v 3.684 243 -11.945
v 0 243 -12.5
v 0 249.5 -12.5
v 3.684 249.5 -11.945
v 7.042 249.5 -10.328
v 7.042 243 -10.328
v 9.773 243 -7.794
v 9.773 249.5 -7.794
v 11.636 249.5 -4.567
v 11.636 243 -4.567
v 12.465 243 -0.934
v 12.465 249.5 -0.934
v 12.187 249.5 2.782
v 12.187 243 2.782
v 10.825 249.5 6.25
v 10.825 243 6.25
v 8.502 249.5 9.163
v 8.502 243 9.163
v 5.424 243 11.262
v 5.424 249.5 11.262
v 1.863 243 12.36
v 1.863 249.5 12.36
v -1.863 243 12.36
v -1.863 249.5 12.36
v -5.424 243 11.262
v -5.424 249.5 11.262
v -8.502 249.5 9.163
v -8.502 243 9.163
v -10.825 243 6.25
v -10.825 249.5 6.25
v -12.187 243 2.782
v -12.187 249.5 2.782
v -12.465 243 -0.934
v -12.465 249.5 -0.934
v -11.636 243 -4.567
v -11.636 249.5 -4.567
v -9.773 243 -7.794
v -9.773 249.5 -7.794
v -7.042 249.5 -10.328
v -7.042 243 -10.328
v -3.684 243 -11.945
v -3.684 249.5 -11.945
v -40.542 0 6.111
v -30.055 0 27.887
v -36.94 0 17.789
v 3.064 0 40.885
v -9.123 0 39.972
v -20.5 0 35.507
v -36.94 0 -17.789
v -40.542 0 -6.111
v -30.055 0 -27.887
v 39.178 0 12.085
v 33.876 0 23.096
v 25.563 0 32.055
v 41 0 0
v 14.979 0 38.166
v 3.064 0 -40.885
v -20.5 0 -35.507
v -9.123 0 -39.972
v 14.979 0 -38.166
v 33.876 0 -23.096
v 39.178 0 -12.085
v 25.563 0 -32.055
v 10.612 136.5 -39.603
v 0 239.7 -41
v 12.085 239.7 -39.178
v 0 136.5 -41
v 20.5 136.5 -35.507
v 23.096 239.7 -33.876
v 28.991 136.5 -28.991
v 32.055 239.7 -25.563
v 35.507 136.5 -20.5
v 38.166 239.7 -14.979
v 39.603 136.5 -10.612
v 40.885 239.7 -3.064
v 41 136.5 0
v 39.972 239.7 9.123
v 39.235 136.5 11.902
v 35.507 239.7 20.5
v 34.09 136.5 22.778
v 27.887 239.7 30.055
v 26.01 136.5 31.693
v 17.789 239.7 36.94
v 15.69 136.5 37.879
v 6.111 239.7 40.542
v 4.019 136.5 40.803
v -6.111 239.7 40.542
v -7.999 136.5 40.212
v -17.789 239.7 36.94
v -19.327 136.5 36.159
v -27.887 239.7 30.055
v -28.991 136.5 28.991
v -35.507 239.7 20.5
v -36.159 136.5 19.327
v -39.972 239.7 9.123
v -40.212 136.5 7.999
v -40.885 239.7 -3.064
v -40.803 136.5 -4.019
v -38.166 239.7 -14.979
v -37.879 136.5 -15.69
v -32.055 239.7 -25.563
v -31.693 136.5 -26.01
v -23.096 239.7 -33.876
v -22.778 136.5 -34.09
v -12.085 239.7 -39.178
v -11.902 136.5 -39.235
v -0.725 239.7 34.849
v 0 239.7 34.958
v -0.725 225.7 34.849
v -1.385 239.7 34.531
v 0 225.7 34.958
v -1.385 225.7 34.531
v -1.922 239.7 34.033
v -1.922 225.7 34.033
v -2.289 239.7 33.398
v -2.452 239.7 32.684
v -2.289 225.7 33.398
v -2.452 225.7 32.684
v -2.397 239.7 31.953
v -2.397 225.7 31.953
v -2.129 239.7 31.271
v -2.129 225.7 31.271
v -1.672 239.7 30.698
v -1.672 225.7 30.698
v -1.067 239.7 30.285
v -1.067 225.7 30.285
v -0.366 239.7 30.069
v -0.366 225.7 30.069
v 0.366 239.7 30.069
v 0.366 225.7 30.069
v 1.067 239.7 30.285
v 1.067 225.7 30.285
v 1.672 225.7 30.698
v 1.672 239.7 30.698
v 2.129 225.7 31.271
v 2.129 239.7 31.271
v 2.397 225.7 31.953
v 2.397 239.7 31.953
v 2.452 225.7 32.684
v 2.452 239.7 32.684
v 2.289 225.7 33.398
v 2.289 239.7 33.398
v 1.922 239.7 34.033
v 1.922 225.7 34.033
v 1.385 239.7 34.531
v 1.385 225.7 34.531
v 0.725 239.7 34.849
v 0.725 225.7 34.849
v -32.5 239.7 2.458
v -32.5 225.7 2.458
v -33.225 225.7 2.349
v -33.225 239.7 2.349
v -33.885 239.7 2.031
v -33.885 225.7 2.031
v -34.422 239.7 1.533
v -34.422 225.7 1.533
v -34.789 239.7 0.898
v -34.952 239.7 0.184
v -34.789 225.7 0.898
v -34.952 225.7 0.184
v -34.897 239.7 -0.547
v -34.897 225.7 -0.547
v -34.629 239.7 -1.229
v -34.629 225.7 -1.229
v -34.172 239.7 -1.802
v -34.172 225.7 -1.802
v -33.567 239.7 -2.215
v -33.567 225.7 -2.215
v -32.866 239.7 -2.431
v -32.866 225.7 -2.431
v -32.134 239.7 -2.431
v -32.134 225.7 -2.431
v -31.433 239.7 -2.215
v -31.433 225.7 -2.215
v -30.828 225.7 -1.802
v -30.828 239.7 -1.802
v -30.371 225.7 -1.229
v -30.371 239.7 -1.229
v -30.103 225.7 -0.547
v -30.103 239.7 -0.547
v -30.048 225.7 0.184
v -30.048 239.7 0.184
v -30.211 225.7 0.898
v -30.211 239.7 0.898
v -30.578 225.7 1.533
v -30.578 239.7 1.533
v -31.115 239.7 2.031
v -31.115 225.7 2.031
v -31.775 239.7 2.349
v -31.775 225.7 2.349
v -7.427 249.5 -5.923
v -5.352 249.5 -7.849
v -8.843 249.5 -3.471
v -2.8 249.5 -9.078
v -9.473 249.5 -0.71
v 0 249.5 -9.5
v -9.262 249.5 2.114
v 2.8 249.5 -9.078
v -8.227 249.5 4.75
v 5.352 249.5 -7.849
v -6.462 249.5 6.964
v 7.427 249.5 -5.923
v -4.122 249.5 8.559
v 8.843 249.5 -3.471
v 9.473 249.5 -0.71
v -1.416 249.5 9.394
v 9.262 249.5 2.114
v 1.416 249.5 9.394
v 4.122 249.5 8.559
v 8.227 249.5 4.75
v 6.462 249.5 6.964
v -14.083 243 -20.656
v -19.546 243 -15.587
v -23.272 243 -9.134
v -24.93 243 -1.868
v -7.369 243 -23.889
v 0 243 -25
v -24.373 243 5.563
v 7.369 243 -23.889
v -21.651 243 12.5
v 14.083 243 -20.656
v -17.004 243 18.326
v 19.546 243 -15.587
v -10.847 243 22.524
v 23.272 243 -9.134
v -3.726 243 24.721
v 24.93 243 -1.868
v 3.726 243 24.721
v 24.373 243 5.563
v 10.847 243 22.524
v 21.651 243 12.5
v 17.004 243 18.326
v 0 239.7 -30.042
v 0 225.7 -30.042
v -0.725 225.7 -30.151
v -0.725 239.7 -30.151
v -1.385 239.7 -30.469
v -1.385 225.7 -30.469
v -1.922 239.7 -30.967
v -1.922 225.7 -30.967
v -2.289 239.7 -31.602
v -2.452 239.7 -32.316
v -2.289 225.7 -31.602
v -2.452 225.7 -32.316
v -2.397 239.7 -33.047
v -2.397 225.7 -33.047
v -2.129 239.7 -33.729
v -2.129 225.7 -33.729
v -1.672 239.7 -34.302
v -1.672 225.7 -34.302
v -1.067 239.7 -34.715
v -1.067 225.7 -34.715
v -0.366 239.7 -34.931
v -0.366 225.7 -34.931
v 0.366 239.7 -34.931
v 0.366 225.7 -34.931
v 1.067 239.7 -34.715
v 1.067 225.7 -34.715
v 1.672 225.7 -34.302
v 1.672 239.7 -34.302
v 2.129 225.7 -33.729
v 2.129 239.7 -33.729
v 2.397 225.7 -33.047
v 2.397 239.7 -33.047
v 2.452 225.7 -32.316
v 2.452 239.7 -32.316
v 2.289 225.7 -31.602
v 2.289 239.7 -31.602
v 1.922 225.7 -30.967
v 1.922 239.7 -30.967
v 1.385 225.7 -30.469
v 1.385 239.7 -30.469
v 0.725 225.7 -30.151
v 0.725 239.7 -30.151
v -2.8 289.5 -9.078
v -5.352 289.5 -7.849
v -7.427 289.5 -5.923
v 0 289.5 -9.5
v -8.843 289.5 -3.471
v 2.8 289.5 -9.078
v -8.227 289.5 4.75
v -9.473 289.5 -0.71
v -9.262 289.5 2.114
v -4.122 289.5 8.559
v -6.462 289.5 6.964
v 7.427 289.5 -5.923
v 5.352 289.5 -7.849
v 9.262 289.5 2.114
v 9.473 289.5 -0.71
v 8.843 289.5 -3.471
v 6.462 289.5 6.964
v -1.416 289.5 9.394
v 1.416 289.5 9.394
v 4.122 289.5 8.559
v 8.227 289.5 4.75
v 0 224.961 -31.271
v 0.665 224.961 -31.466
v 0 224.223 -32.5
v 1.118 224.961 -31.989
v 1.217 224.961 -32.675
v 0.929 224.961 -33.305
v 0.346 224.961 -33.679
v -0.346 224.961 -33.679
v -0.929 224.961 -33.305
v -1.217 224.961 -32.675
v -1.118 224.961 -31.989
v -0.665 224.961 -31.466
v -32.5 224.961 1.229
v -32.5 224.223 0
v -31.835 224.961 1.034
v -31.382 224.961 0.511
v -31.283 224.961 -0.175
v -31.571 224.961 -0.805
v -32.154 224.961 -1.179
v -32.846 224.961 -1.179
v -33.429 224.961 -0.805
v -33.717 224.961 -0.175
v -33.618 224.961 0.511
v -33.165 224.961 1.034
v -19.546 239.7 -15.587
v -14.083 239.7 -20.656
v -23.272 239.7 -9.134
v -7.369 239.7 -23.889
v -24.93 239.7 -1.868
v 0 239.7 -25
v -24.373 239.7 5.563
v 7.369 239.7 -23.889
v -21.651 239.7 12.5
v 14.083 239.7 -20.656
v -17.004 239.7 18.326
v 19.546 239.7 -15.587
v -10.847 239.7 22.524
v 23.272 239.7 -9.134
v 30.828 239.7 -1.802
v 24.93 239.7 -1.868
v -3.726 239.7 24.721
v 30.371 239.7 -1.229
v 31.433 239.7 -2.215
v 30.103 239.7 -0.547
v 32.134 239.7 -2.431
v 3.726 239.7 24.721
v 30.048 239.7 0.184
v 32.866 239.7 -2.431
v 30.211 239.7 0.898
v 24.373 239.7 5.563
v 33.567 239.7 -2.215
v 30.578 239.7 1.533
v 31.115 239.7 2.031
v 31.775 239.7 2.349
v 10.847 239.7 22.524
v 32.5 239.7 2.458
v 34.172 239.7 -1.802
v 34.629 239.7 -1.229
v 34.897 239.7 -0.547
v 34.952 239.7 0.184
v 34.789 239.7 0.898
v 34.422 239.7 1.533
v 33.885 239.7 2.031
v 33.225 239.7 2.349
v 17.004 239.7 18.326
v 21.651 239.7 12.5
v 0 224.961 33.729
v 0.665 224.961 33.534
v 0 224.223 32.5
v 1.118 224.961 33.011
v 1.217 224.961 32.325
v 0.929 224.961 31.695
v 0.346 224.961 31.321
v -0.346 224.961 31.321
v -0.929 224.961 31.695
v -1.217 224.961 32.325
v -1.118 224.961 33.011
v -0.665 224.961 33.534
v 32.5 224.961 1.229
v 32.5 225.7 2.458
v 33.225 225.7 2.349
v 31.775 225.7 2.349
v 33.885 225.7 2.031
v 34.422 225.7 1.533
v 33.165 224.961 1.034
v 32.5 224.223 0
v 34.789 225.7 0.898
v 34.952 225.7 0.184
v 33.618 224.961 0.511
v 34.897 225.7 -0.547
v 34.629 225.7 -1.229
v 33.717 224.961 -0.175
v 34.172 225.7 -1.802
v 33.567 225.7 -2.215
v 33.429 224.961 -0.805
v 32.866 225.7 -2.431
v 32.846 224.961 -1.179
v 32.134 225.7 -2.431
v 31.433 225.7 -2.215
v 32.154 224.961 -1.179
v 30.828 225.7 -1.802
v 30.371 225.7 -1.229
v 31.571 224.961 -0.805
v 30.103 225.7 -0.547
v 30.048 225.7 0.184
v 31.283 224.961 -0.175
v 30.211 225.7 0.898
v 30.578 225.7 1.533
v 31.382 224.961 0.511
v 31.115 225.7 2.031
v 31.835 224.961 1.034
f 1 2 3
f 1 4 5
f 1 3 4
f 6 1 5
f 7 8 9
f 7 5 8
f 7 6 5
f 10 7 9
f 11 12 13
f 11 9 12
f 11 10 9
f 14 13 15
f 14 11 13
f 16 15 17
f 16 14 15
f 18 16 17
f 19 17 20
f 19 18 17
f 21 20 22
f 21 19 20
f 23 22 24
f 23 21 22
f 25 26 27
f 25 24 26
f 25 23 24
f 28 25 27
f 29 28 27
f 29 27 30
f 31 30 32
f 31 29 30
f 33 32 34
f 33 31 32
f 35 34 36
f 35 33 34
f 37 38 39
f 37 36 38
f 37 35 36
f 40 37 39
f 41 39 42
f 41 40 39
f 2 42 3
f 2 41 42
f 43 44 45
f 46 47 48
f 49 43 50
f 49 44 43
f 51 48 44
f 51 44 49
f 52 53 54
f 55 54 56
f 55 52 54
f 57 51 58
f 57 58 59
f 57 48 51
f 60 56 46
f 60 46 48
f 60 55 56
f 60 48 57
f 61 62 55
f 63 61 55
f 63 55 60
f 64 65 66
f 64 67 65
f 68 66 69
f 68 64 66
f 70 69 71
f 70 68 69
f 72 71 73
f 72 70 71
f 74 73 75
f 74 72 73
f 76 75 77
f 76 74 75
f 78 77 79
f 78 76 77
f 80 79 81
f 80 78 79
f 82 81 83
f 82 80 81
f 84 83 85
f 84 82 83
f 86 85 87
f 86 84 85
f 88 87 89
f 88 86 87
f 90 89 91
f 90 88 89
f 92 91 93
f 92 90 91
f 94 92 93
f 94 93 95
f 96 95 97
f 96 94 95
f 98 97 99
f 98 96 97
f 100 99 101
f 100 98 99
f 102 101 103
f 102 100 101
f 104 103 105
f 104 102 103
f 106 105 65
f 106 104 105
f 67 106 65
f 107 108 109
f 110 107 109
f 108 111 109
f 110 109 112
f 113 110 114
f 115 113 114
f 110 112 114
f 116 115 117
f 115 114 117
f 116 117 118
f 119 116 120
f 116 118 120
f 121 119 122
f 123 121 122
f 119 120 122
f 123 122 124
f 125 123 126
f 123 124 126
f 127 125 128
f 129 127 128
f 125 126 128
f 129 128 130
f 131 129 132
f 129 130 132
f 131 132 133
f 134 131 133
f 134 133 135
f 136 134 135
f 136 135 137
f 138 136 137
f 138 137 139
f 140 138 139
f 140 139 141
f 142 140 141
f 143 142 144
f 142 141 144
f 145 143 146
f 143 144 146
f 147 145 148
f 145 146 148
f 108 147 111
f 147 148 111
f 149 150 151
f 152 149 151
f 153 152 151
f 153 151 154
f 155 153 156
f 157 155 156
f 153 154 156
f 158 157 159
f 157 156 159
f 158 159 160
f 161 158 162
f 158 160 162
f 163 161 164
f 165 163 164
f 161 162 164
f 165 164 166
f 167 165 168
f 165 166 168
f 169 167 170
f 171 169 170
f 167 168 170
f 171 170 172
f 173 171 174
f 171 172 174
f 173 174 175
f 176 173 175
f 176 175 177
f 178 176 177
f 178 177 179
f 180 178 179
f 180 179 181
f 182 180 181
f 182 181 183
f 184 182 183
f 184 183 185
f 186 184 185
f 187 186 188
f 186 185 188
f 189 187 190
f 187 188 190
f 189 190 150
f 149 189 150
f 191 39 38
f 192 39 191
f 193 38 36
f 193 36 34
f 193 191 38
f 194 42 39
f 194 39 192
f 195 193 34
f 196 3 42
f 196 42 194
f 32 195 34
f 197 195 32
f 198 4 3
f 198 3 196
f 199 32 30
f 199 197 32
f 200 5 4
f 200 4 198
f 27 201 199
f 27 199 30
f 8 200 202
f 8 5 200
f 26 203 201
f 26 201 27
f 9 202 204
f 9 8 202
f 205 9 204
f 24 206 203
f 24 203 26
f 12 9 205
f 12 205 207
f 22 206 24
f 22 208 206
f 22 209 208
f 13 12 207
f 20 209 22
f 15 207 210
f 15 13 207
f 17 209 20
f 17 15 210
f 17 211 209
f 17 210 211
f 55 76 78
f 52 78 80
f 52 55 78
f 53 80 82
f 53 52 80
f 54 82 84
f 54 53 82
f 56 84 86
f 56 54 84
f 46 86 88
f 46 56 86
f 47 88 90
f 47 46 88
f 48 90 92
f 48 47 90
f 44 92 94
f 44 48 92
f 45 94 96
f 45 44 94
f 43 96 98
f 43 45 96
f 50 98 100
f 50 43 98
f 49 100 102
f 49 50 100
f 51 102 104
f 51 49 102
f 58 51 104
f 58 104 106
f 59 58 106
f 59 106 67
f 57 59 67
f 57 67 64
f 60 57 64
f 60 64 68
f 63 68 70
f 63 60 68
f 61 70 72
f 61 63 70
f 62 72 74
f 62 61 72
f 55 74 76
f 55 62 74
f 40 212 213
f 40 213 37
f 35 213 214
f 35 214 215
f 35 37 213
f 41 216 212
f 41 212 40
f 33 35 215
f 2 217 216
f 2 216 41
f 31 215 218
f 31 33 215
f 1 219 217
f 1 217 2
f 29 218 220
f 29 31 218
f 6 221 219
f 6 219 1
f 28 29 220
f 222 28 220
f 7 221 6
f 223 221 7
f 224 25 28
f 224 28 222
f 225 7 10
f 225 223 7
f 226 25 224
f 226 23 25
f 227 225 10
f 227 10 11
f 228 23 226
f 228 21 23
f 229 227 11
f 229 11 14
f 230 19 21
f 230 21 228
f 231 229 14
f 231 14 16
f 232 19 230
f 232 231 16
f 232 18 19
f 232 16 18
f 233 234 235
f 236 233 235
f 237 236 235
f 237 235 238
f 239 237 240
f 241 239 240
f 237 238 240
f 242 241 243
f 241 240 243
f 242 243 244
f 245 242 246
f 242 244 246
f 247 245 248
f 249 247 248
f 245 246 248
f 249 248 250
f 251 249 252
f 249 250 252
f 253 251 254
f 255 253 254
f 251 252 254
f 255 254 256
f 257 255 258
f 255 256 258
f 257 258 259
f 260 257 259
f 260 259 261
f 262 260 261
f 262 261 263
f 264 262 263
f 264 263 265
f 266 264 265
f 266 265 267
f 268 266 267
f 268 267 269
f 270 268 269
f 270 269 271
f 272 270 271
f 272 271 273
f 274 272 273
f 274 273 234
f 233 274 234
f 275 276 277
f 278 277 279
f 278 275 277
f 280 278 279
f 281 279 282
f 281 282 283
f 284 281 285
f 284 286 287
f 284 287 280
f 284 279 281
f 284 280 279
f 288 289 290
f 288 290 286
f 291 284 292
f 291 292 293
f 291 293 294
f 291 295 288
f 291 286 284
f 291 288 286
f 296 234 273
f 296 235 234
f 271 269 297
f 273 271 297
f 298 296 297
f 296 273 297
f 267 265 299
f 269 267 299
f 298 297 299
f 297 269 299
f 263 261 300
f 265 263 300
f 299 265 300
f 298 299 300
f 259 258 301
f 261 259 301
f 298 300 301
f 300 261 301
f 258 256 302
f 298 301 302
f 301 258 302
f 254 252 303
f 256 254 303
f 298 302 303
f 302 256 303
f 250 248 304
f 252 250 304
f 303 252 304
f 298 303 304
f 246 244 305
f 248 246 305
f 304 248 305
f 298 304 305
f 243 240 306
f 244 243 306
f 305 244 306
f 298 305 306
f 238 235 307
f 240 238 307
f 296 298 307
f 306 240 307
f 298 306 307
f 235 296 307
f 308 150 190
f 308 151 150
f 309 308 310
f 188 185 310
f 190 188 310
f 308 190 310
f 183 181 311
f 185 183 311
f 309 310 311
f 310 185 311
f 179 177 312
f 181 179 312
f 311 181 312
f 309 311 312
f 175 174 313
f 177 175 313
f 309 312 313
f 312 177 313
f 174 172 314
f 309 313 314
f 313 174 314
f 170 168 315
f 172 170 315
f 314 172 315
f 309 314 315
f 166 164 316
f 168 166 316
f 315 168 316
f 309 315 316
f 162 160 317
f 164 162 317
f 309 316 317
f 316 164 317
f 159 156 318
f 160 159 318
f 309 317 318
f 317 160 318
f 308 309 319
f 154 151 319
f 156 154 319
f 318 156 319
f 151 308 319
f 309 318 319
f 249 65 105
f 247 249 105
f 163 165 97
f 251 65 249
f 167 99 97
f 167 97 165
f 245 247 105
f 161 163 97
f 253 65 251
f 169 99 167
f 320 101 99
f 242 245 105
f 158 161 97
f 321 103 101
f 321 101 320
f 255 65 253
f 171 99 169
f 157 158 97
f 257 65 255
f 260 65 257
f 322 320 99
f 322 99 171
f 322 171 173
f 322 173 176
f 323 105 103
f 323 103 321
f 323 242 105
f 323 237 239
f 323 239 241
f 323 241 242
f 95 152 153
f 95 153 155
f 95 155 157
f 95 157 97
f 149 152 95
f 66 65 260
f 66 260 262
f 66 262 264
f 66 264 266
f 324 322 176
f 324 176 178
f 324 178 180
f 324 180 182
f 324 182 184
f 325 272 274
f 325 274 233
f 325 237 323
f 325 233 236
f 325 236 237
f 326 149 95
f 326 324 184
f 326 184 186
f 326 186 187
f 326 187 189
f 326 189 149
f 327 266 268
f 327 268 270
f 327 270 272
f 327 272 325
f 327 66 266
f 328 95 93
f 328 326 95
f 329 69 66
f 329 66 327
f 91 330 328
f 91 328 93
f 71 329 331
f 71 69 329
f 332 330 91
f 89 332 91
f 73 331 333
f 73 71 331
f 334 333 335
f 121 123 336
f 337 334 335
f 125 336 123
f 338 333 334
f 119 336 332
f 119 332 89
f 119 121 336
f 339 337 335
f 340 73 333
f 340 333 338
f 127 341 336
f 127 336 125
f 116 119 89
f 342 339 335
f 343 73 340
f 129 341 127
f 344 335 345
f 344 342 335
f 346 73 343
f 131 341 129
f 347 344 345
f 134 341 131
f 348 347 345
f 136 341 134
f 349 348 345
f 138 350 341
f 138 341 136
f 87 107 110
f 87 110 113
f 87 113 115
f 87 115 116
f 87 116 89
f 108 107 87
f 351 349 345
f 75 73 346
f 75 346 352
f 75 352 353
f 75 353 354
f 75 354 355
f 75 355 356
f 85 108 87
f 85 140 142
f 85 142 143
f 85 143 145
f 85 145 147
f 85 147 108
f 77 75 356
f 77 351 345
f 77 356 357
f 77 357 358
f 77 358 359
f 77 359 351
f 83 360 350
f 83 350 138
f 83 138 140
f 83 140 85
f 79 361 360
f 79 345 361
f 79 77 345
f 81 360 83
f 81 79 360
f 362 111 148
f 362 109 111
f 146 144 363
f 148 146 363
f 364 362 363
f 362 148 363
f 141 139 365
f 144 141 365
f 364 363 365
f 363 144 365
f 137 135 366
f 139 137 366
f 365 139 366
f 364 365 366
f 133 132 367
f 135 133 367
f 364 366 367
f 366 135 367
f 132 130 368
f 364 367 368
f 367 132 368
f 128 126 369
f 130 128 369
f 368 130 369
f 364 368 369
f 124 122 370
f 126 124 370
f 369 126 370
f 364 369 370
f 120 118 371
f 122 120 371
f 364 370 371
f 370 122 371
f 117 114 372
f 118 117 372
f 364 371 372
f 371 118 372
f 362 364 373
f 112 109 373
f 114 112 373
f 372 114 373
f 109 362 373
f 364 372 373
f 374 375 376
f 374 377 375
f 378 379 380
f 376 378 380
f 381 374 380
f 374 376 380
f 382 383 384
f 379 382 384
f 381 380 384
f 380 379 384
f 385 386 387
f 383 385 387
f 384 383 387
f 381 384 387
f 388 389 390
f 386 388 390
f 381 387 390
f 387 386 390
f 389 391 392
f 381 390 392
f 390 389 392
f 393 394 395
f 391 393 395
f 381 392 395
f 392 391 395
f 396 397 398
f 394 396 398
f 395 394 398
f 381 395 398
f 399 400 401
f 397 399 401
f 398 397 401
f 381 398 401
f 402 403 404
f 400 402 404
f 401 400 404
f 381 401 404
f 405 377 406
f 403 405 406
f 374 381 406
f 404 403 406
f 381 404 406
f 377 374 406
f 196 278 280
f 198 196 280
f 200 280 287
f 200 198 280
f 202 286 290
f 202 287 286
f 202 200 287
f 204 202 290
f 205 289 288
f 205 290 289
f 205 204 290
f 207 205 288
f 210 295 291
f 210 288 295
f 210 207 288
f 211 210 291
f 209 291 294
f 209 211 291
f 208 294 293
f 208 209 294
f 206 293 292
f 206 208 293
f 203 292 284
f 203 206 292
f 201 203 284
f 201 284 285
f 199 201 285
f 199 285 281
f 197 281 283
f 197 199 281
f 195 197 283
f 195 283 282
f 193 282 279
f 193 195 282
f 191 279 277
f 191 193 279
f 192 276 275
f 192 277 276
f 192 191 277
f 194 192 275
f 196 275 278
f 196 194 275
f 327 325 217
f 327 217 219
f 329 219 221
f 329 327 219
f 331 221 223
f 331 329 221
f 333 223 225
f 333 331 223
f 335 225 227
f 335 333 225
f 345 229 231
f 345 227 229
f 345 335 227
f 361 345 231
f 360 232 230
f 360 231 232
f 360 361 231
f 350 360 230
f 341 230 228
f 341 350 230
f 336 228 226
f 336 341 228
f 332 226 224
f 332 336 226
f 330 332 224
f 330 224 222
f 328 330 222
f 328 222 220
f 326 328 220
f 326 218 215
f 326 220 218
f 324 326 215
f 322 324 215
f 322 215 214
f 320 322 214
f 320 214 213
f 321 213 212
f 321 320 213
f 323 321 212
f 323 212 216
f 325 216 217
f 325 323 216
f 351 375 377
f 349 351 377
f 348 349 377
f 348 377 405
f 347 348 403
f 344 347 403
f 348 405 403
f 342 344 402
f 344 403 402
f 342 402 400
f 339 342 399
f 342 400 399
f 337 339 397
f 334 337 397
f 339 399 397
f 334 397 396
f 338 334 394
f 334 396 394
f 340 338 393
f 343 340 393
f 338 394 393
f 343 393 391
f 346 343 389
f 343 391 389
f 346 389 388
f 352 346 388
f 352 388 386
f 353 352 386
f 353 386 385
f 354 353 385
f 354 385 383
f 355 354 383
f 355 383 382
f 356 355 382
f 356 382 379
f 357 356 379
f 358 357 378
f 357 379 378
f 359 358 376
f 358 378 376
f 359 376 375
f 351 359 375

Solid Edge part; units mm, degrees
sketch "Sketch1" plane through (0, 0, 0) normal (0, -1, 0) x (1, 0, 0)
  circle A0 centre (0, 0) radius 41
extrude "Protrusion1" add sketch "Sketch1" against normal blind 136.5
sketch "Sketch2" plane through (0, 136.5, 0) normal (0, 1, 0) x (0, 0, -1)
  circle A0 centre (0, 0) radius 41
extrude "Stufenzahl_3" add sketch "Sketch2" along normal blind 103.2
sketch "Sketch3" plane through (0, 239.7, 0) normal (0, 1, 0) x (0, 0, -1)
  circle A0 centre (0, 0) radius 25
extrude "Extrusionsausprägung_3" add sketch "Sketch3" along normal blind 3.3
sketch "Sketch4" plane through (0, 243, 0) normal (0, 1, 0) x (0, 0, -1)
  circle A0 centre (0, 0) radius 12.5
extrude "Extrusionsausprägung_4" add sketch "Sketch4" along normal blind 6.5
sketch "Sketch5" plane through (0, 249.5, 0) normal (0, 1, 0) x (0, 0, -1)
  circle A0 centre (0, 0) radius 9.5
extrude "Extrusionsausprägung_5" add sketch "Sketch5" along normal blind 40
hole "Bohrung_1" at (0, 239.7, -32.5) direction (0, -1, 0) diameter 4.917 depth 14 tip angle 118 thread major 6 thread length 10
hole "Hole1" at (-32.5, 239.7, 0) direction (0, -1, 0) diameter 4.917 depth 14 tip angle 118 thread major 6 thread length 10
hole "Hole2" at (0, 239.7, 32.5) direction (0, -1, 0) diameter 4.917 depth 14 tip angle 118 thread major 6 thread length 10
hole "Hole3" at (32.5, 239.7, 0) direction (0, -1, 0) diameter 4.917 depth 14 tip angle 118 thread major 6 thread length 10
